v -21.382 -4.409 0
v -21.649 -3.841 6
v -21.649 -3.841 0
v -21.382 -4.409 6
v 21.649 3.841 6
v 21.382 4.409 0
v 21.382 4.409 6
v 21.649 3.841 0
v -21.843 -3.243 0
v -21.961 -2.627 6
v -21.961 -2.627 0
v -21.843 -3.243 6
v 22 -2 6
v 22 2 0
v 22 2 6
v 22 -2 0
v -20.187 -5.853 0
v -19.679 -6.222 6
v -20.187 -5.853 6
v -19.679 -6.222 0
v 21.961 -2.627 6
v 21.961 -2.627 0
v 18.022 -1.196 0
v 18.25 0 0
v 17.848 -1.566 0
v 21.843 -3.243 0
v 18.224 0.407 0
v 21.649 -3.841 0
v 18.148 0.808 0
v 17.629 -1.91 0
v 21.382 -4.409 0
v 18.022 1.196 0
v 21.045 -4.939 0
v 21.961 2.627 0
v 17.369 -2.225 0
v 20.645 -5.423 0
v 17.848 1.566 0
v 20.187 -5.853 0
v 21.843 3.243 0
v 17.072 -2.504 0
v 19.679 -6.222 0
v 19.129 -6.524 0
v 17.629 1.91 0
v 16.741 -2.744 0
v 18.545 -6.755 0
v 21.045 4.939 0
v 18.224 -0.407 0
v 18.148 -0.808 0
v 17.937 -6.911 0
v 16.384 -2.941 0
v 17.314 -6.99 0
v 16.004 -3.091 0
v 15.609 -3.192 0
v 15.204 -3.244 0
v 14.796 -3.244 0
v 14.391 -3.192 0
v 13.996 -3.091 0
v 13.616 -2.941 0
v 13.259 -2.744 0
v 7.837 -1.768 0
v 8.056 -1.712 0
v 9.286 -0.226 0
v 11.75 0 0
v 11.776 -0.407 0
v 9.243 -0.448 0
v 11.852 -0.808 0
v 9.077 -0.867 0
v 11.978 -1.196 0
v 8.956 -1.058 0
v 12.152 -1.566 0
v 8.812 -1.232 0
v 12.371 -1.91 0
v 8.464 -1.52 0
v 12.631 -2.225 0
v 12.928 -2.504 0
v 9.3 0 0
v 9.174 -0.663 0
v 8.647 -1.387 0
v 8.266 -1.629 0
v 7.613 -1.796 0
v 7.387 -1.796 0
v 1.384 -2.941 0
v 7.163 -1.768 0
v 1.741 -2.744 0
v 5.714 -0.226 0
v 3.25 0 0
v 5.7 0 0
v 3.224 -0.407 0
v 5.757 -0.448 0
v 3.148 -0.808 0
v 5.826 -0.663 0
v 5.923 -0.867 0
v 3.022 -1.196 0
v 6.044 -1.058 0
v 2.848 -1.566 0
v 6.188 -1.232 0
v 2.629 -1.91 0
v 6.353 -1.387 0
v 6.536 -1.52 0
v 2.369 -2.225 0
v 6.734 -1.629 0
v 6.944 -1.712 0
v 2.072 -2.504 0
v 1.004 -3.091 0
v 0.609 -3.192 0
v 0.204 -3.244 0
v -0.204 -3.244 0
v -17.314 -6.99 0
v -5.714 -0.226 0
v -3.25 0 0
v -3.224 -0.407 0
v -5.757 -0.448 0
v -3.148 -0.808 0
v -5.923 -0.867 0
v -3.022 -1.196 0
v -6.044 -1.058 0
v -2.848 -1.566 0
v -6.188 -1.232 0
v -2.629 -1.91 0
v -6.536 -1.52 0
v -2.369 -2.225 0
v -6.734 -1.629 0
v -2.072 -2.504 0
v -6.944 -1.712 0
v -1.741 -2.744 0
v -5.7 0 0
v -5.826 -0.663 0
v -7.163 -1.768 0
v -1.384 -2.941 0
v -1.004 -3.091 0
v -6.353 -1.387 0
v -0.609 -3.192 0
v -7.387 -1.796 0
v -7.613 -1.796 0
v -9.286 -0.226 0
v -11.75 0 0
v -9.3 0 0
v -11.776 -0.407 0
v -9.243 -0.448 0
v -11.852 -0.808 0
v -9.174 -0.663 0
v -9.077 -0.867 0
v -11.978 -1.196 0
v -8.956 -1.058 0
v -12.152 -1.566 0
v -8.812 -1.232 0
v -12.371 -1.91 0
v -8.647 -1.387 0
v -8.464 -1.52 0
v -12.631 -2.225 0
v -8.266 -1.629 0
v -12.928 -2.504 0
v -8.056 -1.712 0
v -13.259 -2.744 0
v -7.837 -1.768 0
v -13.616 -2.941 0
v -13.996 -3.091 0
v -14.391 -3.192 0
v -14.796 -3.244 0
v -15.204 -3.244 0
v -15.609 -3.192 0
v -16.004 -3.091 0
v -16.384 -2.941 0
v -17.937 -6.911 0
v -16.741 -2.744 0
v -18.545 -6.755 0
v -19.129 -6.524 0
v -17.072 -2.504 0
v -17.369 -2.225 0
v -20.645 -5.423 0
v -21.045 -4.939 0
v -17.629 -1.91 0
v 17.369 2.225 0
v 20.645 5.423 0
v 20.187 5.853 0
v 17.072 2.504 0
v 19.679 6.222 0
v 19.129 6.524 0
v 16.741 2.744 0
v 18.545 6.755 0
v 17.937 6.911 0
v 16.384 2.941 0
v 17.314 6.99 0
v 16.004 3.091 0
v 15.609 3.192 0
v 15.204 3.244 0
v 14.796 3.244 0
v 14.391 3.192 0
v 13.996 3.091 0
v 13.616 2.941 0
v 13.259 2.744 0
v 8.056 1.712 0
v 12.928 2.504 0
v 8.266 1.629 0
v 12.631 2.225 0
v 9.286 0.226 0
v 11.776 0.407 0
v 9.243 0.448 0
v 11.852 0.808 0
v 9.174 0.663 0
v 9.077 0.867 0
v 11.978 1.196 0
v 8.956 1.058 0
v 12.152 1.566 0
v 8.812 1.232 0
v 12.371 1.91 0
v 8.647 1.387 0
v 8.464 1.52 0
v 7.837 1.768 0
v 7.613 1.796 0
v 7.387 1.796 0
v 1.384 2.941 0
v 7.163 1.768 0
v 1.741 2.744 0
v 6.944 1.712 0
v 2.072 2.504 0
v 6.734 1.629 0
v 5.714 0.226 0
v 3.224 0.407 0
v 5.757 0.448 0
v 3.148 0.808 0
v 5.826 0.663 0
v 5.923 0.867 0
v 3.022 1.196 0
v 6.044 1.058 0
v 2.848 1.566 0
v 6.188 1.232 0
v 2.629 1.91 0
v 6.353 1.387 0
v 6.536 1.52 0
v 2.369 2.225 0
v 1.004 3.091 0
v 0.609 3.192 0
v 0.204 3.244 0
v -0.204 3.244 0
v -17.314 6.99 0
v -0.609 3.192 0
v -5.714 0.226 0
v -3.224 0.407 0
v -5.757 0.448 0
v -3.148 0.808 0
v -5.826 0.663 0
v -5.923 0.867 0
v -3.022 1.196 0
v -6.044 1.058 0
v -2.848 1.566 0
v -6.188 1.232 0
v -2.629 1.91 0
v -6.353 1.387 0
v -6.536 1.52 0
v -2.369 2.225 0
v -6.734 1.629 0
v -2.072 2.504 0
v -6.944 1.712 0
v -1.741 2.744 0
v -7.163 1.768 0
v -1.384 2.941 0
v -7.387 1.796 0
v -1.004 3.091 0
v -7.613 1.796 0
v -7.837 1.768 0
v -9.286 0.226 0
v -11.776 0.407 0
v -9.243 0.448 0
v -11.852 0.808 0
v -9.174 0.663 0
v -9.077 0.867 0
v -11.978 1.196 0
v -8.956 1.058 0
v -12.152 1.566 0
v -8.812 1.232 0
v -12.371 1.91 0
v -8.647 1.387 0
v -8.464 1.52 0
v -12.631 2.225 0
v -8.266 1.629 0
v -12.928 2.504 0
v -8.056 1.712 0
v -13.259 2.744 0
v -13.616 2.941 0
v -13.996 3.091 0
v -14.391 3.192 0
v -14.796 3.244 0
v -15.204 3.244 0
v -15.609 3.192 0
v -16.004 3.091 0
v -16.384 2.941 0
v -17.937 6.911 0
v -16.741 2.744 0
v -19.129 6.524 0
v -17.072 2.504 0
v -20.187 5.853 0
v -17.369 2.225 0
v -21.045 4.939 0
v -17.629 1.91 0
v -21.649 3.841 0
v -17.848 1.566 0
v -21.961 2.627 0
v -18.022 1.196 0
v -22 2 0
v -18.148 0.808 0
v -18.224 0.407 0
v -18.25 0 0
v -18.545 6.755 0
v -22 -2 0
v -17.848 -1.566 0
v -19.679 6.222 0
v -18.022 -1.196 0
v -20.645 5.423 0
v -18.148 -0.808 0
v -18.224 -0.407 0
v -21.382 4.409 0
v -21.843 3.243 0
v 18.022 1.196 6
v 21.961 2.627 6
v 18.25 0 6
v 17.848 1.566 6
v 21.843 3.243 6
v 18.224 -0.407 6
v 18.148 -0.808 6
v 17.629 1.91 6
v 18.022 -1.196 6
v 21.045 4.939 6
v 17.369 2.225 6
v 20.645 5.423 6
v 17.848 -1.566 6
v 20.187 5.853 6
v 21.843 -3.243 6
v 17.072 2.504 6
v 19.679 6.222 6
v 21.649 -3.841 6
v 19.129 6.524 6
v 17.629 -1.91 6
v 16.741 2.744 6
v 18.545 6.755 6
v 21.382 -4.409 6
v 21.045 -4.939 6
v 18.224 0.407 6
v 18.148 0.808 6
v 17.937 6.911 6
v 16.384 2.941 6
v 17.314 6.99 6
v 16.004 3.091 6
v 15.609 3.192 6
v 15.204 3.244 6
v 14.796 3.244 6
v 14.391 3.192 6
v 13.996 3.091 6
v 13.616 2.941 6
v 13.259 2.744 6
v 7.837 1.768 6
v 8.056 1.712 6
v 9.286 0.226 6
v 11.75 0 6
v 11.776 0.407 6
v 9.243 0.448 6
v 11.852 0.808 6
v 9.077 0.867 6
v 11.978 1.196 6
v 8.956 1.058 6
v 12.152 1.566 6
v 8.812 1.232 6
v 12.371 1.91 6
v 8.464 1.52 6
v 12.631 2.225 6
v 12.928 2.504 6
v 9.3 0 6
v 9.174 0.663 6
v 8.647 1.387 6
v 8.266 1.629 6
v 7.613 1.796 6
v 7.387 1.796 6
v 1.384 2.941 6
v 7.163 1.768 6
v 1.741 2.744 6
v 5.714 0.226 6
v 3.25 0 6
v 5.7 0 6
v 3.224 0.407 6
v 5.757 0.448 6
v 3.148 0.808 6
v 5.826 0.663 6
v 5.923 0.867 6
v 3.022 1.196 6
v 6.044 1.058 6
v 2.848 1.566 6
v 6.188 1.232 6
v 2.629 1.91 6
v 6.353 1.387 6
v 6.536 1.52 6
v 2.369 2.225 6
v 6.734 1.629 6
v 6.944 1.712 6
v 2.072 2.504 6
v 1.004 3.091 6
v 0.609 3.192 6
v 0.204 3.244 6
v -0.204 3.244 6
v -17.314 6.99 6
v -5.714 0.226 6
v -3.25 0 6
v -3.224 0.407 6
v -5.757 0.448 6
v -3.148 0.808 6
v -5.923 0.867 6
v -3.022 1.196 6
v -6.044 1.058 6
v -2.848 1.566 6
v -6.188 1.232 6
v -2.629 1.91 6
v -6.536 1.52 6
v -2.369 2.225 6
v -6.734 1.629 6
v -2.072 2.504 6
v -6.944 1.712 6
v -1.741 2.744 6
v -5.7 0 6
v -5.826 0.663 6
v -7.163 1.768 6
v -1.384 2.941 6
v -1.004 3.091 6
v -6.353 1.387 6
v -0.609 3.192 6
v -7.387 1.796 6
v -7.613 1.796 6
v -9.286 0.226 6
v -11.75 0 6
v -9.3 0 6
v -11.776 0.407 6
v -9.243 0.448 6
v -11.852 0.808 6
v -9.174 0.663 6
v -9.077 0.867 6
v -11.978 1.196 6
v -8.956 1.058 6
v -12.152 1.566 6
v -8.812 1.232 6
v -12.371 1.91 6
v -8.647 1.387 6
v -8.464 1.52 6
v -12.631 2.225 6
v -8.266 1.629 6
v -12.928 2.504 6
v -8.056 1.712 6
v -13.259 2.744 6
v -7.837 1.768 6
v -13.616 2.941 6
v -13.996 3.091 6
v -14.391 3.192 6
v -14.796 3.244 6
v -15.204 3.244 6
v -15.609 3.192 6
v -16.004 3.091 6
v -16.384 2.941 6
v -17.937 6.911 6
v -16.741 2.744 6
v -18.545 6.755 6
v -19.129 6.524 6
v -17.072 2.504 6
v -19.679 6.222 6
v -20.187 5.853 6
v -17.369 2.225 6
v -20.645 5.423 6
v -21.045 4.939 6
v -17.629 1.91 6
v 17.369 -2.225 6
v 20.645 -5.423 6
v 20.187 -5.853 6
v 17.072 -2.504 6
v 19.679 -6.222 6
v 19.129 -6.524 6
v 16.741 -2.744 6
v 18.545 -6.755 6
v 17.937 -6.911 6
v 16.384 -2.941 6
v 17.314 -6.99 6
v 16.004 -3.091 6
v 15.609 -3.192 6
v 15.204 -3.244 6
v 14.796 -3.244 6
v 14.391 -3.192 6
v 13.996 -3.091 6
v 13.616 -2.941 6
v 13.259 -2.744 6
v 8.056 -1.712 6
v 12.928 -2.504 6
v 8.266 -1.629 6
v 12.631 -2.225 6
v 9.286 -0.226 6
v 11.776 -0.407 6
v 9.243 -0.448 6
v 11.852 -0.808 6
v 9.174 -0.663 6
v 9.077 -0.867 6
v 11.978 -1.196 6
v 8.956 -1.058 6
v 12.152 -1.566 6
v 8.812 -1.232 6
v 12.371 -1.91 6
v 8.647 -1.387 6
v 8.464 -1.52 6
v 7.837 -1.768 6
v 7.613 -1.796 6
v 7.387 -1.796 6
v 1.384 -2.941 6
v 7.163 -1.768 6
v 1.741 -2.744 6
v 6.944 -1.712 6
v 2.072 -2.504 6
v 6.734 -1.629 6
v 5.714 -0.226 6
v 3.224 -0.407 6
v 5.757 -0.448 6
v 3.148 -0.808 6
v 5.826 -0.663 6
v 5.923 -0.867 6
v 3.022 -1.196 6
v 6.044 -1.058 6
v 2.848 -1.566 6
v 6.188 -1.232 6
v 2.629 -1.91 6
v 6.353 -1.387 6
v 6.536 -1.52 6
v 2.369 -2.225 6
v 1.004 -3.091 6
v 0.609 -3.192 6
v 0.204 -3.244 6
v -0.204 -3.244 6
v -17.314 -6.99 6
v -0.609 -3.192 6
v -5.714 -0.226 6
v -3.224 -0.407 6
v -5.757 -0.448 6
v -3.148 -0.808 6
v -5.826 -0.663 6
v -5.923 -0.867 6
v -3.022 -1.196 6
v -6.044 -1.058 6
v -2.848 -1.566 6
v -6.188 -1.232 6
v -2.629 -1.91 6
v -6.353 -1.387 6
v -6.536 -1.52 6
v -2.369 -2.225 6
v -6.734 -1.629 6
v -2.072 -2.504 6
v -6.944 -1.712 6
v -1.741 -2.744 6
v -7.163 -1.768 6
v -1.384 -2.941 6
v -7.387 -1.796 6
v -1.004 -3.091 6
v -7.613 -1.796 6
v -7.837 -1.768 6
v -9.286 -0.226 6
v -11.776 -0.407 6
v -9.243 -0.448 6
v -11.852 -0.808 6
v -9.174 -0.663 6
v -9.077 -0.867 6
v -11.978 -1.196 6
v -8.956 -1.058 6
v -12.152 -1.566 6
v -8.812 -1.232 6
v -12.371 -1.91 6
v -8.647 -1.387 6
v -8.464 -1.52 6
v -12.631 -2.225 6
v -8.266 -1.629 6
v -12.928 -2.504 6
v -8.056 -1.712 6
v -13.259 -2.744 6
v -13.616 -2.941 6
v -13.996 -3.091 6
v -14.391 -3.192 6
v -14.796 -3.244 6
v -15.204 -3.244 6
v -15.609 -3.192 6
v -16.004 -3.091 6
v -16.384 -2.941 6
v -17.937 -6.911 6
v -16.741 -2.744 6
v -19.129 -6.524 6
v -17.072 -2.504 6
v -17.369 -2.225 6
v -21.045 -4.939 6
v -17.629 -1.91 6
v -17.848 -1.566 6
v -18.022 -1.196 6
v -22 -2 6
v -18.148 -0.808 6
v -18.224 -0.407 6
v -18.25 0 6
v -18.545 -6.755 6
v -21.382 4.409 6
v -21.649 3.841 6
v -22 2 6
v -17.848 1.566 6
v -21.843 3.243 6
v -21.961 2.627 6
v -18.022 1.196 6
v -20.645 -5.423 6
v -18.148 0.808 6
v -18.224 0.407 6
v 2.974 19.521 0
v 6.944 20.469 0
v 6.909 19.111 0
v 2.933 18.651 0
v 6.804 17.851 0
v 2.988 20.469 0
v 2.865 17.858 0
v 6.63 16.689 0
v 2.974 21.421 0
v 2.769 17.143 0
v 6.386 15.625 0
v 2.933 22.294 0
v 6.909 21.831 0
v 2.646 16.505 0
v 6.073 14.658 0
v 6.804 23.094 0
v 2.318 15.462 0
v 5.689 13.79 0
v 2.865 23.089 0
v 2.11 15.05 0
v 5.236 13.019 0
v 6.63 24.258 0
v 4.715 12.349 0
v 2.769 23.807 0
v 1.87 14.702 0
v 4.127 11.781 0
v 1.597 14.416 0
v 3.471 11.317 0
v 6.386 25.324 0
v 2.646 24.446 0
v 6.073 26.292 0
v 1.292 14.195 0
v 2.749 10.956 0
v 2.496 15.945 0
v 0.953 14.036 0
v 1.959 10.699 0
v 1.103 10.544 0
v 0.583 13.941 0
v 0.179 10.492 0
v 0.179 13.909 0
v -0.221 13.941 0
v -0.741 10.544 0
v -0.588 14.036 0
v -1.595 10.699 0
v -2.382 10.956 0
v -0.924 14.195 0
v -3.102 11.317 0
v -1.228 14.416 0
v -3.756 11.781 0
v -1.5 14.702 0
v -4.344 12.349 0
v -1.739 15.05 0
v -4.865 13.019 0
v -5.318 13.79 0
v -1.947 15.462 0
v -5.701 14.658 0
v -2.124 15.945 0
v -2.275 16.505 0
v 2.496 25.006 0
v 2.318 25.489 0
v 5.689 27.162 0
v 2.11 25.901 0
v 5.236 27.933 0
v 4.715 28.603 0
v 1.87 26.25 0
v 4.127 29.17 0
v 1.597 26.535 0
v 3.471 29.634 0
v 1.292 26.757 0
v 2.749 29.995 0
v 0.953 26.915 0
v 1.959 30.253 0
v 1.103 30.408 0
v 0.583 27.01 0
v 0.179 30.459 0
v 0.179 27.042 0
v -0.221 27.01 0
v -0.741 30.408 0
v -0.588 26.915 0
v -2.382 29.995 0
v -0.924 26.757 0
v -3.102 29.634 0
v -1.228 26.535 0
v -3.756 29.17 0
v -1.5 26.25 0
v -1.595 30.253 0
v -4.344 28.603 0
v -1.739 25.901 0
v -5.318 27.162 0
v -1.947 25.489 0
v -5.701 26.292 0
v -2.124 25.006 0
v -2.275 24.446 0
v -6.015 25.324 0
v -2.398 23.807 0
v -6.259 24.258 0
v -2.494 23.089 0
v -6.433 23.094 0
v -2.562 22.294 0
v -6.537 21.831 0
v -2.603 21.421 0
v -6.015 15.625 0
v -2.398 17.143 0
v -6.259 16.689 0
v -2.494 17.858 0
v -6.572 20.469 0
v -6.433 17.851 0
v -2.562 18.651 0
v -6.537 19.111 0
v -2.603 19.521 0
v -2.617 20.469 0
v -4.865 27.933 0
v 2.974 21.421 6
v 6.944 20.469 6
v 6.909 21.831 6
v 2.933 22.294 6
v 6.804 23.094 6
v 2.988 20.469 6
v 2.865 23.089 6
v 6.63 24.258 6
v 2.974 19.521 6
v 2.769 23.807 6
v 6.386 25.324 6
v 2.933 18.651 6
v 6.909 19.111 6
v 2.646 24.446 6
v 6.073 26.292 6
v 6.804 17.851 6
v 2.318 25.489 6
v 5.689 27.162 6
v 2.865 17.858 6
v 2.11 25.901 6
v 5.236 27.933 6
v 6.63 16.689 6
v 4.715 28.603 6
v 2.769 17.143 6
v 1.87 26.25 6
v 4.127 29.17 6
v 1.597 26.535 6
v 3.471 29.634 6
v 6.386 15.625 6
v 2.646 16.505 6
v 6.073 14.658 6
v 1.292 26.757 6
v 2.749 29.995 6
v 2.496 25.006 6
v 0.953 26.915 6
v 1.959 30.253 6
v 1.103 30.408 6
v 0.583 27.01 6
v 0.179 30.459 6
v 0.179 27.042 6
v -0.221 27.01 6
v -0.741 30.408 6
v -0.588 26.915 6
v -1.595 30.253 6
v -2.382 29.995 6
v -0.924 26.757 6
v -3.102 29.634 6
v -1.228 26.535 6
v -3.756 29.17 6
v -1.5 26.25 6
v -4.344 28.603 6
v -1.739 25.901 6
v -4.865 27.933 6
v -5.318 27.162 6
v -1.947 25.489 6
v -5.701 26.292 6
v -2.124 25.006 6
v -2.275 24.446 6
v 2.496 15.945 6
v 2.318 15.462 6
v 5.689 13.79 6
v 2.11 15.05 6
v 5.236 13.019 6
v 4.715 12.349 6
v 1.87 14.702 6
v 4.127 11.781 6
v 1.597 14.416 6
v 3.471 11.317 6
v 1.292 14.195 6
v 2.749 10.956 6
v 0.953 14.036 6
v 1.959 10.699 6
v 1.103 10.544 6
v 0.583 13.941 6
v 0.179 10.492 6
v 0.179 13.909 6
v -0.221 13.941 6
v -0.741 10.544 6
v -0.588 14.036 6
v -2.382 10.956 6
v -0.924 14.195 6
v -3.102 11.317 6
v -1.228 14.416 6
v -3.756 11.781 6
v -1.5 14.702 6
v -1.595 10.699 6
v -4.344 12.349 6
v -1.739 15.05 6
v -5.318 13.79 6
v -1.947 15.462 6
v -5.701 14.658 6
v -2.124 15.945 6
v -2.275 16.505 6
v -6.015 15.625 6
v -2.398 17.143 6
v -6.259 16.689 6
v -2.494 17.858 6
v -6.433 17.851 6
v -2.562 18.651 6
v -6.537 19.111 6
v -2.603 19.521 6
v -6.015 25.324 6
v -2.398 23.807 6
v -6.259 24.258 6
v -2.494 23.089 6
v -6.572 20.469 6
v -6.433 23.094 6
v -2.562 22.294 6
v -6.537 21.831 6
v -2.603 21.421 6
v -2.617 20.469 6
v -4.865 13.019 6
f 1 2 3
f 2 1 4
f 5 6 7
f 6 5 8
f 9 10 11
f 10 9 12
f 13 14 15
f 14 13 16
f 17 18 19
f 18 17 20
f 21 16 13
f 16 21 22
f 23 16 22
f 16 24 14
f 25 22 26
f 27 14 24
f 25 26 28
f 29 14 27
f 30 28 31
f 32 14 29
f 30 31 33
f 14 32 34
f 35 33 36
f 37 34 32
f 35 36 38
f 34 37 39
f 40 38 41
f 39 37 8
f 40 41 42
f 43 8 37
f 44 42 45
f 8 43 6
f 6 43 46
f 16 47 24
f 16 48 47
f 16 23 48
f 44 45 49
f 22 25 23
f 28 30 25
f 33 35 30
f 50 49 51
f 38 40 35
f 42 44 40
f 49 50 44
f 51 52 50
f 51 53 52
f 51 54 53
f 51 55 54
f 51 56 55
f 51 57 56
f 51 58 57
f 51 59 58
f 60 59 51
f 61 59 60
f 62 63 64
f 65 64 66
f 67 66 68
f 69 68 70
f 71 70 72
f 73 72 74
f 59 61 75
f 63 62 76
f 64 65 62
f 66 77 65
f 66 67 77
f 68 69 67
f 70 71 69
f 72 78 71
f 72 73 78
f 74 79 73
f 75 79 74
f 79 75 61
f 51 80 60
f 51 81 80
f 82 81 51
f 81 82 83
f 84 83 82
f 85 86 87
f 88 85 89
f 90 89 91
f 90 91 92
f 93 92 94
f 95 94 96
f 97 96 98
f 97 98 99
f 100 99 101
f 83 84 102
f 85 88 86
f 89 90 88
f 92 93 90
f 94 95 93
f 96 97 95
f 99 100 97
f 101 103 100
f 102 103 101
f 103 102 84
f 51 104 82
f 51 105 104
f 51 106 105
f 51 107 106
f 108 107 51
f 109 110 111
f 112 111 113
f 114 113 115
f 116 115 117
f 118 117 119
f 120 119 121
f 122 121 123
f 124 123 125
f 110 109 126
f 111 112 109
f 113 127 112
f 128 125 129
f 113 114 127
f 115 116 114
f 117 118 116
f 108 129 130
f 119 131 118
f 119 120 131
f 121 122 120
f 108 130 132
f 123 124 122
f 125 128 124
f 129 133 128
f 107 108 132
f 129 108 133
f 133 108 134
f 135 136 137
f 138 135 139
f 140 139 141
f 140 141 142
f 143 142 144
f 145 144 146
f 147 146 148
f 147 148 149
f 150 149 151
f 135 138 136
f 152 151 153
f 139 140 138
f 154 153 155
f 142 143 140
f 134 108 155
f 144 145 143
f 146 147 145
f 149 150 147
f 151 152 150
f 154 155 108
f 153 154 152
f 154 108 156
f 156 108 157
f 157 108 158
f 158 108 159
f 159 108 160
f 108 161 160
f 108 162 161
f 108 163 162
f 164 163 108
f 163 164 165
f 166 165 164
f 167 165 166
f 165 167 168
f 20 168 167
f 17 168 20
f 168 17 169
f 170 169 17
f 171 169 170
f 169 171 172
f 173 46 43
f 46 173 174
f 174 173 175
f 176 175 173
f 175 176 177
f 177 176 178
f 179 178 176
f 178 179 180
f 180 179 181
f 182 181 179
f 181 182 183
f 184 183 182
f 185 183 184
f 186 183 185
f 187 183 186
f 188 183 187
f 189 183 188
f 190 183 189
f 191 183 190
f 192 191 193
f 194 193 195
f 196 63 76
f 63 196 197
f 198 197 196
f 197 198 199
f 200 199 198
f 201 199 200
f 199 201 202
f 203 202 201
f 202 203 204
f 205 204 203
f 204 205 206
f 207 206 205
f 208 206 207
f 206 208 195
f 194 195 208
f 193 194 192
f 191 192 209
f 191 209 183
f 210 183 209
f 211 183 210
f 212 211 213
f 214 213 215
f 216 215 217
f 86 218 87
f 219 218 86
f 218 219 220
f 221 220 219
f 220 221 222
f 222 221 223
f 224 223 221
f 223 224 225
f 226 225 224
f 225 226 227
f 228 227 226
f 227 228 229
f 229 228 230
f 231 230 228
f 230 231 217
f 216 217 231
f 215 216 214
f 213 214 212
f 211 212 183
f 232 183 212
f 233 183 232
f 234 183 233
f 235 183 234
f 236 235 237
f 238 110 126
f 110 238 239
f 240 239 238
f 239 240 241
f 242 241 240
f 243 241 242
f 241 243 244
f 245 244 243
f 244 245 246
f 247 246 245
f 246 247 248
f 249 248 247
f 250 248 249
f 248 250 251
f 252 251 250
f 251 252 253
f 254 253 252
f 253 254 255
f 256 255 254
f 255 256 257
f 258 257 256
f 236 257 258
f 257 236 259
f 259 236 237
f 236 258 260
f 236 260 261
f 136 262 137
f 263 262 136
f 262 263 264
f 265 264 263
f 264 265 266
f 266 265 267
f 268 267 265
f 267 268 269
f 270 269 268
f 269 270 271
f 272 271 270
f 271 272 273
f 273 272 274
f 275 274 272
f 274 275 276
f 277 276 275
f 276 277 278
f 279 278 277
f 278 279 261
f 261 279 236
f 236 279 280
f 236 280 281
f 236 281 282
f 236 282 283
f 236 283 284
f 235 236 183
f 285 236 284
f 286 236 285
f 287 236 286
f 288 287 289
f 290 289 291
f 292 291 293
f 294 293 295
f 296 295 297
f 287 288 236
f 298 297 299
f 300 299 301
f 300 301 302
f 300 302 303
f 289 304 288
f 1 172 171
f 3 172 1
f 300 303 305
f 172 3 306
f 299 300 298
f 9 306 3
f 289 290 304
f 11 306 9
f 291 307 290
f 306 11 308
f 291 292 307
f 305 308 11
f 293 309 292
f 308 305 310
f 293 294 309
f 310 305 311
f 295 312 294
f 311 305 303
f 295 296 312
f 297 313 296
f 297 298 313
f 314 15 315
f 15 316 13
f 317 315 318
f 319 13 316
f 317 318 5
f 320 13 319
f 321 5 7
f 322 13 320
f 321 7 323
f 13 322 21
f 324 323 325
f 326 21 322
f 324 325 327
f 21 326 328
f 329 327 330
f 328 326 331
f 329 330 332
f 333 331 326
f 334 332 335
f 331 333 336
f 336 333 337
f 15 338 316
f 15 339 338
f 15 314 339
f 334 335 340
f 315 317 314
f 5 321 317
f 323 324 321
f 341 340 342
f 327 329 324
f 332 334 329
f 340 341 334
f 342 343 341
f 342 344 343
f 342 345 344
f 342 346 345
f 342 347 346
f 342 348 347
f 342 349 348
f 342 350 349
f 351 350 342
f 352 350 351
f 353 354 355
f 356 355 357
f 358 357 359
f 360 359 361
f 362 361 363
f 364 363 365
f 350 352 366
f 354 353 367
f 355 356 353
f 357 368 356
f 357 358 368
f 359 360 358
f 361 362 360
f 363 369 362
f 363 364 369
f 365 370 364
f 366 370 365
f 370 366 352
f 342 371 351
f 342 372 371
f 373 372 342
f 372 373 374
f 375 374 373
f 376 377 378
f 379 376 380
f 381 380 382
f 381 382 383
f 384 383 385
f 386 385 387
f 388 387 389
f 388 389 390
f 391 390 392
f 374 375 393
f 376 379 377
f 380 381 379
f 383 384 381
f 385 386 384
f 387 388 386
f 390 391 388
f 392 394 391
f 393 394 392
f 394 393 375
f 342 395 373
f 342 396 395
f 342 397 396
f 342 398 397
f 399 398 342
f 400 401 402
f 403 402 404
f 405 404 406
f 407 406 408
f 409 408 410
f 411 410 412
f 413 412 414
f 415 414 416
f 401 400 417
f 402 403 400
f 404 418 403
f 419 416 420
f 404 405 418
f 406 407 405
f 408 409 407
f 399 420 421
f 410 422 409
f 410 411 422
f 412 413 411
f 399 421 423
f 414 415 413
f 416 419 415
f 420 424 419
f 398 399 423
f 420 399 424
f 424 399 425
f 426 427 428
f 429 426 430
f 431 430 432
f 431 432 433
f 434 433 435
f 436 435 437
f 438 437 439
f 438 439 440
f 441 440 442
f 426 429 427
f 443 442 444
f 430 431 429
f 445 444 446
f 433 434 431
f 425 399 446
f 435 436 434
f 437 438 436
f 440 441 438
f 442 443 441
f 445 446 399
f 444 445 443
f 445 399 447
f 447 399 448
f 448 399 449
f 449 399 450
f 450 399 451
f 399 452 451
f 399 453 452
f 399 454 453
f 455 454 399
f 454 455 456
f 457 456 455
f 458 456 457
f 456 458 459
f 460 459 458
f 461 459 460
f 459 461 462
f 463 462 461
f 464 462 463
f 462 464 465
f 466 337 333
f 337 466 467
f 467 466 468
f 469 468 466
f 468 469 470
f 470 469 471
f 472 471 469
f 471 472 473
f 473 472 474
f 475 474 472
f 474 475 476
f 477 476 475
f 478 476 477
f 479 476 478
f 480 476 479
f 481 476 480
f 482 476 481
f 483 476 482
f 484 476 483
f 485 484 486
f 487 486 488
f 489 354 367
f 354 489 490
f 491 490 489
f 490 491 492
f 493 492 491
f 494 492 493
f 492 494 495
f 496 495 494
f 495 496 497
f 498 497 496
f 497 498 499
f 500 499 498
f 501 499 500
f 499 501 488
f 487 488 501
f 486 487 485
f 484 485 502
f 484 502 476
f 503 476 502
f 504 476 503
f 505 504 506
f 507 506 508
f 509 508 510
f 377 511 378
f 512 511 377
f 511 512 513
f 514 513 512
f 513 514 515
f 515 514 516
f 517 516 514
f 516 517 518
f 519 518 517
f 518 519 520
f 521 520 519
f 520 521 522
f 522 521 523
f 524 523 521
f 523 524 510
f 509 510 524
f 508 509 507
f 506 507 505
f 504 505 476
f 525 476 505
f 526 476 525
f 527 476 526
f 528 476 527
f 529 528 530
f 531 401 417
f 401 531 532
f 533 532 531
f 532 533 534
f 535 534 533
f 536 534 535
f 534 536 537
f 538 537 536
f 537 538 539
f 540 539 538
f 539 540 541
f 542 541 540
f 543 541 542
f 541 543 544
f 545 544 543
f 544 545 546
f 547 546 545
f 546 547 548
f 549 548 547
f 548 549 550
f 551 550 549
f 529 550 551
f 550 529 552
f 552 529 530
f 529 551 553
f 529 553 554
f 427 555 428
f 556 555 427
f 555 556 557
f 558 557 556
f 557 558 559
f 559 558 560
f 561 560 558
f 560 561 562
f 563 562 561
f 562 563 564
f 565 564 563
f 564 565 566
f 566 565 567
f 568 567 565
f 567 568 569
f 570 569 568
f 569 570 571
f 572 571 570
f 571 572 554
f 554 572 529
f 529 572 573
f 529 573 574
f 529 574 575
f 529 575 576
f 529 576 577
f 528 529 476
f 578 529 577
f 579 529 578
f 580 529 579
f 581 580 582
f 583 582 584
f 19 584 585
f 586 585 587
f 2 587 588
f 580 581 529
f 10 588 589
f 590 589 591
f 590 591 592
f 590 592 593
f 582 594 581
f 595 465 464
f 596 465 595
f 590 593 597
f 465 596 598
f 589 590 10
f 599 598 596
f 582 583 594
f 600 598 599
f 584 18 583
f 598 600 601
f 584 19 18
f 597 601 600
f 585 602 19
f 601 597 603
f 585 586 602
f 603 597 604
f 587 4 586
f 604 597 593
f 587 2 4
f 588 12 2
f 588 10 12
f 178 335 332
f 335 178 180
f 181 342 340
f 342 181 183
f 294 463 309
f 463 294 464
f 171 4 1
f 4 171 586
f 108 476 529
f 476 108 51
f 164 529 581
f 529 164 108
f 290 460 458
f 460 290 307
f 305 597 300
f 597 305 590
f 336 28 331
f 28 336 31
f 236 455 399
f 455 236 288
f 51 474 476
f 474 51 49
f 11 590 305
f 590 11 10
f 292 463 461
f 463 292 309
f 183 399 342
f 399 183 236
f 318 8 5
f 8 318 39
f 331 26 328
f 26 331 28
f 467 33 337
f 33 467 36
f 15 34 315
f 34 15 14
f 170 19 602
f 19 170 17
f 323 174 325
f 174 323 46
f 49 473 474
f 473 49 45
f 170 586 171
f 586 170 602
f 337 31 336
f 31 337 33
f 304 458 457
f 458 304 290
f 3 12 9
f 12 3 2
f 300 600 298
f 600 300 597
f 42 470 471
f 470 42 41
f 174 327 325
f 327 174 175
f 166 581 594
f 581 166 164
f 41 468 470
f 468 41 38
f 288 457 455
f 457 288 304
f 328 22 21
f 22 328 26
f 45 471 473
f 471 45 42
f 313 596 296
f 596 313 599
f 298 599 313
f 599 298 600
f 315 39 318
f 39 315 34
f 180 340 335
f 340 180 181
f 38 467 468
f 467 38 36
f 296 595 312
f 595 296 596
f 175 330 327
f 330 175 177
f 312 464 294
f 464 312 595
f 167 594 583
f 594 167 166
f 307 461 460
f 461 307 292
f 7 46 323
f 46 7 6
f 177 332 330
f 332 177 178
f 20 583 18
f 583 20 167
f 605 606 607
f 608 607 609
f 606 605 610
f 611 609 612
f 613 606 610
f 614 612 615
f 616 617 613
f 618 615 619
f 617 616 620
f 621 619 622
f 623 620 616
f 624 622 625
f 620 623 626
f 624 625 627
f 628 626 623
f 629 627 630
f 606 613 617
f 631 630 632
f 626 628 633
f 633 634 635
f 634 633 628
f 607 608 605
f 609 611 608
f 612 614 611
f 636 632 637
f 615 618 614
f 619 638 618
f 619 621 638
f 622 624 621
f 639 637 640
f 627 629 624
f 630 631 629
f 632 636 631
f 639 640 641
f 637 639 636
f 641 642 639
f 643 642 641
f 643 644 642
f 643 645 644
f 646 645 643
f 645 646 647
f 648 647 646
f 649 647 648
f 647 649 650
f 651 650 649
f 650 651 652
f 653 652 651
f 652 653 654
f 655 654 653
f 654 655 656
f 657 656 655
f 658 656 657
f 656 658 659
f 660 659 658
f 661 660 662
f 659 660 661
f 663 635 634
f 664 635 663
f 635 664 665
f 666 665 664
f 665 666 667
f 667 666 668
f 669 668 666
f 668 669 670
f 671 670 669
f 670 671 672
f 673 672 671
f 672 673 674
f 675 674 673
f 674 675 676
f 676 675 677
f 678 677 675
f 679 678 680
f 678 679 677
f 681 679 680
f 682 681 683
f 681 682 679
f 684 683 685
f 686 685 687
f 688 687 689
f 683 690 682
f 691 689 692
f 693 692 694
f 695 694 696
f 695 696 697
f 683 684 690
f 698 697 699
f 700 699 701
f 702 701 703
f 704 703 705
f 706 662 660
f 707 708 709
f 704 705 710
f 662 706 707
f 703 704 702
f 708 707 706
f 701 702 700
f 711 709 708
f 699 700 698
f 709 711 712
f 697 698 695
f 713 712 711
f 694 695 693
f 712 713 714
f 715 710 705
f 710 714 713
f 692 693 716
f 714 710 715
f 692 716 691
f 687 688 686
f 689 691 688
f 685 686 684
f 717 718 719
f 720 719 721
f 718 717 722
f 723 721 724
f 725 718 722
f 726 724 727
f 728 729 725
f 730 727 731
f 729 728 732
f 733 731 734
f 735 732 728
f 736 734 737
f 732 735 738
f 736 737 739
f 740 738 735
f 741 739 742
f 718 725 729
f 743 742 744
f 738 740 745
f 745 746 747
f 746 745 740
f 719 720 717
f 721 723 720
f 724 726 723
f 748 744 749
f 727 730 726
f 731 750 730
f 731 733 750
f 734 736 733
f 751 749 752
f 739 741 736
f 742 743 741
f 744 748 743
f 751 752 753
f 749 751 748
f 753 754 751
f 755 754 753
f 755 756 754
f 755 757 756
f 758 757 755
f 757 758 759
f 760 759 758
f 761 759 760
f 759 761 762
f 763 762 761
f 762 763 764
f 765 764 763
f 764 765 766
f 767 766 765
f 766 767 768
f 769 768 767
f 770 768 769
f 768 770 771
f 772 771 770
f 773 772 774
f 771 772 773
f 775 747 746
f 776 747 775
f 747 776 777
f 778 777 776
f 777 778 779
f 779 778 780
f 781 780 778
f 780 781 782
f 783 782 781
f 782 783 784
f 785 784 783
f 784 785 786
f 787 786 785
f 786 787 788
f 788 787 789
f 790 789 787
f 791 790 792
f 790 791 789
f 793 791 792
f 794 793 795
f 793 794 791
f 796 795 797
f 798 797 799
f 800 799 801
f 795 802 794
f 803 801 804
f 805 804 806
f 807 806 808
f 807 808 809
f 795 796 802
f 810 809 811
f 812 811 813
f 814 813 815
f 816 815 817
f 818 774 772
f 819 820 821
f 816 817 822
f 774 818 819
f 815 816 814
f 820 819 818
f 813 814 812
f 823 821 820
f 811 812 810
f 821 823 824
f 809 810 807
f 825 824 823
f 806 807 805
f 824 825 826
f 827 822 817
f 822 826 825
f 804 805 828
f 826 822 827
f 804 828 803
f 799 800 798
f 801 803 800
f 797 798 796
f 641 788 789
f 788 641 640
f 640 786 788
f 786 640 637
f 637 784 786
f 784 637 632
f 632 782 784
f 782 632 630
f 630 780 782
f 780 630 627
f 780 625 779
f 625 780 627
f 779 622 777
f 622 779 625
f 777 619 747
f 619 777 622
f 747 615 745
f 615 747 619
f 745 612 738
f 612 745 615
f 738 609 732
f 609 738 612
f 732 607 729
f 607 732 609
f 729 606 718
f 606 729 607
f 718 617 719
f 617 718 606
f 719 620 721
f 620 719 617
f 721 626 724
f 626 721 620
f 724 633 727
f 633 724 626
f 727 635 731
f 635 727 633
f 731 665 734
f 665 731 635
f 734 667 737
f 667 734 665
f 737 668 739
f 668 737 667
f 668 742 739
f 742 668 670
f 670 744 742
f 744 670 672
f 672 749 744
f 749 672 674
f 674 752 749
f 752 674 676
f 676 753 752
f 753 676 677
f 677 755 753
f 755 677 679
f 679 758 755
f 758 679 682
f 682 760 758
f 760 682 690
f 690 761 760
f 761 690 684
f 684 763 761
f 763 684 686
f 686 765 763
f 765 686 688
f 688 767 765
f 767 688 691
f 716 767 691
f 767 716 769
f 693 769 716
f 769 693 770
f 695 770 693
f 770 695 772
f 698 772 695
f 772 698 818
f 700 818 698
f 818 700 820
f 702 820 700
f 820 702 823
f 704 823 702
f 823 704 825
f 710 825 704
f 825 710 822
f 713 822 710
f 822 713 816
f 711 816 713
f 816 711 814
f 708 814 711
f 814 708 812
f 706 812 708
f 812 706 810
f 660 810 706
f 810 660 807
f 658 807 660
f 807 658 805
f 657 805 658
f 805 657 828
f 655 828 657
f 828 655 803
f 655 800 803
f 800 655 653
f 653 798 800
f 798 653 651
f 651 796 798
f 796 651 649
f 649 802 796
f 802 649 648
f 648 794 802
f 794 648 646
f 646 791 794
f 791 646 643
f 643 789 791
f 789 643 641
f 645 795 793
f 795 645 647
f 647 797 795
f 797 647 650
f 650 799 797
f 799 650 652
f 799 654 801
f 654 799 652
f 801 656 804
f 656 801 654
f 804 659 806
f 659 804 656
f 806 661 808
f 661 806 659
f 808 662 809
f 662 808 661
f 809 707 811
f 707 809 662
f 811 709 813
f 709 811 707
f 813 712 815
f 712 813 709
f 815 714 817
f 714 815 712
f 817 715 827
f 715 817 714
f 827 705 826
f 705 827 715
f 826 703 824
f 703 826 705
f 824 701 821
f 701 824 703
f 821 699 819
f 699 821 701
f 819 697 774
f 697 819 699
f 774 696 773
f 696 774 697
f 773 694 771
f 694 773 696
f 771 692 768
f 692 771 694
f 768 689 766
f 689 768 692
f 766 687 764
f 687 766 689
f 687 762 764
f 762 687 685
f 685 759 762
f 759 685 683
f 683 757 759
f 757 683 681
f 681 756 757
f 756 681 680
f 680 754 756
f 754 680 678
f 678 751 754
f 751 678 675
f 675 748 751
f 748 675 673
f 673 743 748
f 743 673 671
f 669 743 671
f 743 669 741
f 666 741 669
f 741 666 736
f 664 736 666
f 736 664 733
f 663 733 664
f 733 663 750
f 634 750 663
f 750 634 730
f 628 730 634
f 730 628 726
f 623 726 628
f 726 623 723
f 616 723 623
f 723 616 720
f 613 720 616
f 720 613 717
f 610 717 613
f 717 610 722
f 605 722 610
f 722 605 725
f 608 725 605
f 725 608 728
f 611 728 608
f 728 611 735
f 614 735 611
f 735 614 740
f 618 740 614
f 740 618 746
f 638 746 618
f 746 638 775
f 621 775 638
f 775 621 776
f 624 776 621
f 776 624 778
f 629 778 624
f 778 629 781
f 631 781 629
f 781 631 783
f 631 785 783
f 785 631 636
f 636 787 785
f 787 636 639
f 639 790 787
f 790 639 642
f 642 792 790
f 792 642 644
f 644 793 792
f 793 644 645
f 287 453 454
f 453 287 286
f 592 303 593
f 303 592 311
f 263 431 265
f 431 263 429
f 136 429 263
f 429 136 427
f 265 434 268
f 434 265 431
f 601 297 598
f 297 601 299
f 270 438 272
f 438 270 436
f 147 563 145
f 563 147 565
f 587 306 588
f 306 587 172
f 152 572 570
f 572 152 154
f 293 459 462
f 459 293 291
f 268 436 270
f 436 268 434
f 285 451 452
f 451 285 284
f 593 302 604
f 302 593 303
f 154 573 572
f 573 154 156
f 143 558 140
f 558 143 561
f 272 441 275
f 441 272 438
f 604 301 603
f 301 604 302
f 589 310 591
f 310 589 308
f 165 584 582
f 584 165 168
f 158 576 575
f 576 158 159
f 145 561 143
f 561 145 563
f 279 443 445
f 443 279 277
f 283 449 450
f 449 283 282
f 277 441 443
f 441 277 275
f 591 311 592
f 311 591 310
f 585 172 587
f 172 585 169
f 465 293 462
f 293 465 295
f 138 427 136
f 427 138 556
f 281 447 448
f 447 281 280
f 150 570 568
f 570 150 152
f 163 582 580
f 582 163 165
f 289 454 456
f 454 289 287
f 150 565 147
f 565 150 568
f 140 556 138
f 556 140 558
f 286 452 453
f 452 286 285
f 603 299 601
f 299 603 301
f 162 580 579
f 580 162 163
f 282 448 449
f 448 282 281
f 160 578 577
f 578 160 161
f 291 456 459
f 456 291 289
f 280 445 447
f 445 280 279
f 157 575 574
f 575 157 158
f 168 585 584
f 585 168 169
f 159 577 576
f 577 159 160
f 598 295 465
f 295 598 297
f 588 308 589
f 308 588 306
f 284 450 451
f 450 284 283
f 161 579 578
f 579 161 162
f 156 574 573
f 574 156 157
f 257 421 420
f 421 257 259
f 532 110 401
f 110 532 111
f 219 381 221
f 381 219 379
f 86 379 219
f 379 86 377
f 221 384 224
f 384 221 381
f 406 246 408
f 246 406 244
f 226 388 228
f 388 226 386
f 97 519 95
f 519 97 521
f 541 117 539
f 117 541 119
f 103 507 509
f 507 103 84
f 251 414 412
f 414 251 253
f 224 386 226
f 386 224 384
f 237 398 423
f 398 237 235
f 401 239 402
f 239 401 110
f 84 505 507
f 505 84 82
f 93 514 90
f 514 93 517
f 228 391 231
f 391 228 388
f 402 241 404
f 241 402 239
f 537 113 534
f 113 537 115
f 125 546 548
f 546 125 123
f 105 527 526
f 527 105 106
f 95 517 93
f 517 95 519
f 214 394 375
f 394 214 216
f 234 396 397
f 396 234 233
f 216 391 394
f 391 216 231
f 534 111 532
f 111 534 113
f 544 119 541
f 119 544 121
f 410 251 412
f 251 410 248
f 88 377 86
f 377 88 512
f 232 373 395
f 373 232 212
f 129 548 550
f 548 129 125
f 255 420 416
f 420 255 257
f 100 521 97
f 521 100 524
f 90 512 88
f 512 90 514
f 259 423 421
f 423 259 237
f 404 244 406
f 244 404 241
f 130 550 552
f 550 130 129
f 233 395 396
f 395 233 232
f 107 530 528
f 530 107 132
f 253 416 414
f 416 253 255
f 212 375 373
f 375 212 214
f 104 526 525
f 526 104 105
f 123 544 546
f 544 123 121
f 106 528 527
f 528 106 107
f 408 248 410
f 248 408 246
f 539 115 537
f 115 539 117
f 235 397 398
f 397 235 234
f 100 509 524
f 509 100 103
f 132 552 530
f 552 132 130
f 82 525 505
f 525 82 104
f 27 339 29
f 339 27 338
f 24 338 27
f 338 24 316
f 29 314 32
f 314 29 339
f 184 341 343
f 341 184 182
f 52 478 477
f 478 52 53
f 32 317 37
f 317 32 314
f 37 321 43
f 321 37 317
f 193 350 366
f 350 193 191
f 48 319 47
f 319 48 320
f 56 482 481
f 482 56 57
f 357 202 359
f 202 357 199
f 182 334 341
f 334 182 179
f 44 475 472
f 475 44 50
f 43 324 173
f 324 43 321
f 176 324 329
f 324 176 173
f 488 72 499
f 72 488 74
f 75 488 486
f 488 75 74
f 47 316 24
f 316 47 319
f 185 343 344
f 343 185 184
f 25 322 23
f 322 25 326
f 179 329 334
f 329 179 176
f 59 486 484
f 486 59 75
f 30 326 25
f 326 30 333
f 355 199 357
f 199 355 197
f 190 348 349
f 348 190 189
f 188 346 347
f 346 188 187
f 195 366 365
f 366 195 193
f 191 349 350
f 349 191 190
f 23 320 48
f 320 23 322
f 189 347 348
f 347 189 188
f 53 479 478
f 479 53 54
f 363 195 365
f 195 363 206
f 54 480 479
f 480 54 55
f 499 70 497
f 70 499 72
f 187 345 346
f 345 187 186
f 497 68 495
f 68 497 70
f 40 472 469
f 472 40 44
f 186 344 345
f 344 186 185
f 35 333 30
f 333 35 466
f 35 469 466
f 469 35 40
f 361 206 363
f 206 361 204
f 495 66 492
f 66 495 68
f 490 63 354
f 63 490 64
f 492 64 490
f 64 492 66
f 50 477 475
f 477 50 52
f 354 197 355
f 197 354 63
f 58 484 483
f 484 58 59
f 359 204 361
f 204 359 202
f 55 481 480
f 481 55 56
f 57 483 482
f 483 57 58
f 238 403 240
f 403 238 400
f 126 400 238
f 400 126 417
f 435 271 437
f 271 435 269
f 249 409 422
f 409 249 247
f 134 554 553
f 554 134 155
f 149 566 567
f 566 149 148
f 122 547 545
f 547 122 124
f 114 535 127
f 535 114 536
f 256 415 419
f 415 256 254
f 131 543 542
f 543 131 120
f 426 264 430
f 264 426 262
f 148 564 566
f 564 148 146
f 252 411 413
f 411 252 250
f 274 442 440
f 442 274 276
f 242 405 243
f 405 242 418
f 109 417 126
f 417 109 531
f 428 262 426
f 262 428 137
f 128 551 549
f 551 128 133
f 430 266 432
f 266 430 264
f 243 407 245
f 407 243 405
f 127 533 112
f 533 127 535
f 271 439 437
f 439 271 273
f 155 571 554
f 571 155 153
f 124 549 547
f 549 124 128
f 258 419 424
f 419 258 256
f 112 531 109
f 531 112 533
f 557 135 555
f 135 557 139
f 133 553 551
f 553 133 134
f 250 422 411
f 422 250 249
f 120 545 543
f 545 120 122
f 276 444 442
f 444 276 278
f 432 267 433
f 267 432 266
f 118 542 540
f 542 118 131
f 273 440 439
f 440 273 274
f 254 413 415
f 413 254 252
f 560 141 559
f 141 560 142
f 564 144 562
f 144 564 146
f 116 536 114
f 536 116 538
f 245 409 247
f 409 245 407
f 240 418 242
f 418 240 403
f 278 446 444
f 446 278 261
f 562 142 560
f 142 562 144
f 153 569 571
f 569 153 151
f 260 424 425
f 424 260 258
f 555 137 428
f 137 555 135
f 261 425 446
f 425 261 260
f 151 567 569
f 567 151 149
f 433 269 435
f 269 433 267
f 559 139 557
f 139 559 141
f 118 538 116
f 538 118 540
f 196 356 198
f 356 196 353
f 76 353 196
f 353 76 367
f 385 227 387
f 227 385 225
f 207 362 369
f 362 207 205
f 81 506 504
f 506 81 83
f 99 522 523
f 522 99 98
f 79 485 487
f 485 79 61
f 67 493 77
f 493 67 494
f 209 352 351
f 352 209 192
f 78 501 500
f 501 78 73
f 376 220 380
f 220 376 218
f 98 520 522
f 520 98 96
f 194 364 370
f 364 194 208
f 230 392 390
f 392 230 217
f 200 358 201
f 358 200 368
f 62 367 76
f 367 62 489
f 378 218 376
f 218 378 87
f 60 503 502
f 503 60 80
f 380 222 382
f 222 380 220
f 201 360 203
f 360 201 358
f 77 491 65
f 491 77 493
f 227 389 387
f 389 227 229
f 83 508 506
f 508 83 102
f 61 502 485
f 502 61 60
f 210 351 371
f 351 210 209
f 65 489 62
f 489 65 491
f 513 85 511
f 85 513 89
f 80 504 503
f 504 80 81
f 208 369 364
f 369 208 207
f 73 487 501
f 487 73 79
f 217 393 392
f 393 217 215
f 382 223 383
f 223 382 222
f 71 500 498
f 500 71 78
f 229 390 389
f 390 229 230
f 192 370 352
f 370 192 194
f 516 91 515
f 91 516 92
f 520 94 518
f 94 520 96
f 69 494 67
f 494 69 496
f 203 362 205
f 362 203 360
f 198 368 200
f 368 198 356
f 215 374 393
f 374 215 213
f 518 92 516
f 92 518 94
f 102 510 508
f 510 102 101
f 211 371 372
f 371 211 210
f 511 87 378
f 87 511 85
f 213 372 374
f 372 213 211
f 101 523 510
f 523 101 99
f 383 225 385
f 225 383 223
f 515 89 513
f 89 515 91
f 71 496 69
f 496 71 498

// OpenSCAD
$fn = 50;


difference() {
	union() {
		hull() {
			translate(v = [-17.0000000000, 2.0000000000, 0]) {
				cylinder(h = 6, r = 5);
			}
			translate(v = [17.0000000000, 2.0000000000, 0]) {
				cylinder(h = 6, r = 5);
			}
			translate(v = [-17.0000000000, -2.0000000000, 0]) {
				cylinder(h = 6, r = 5);
			}
			translate(v = [17.0000000000, -2.0000000000, 0]) {
				cylinder(h = 6, r = 5);
			}
		}
		translate(v = [0, 30.0000000000, 0]) {
			linear_extrude(height = 6) {
				text(font = "DejaVu Sans Mono:style=Bold", halign = "center", size = 19.0000000000, text = "O", valign = "top");
			}
		}
	}
	union() {
		translate(v = [-15.0000000000, 0.0000000000, 0]) {
			translate(v = [0, 0, -100]) {
				cylinder(h = 200, r = 3.2500000000);
			}
		}
		translate(v = [0, 0, -100]) {
			cylinder(h = 200, r = 3.2500000000);
		}
		translate(v = [15.0000000000, 0.0000000000, 0]) {
			translate(v = [0, 0, -100]) {
				cylinder(h = 200, r = 3.2500000000);
			}
		}
		translate(v = [-15.0000000000, 0.0000000000, 0]) {
			translate(v = [0, 0, -100]) {
				cylinder(h = 200, r = 1.8000000000);
			}
		}
		translate(v = [-7.5000000000, 0.0000000000, 0]) {
			translate(v = [0, 0, -100]) {
				cylinder(h = 200, r = 1.8000000000);
			}
		}
		translate(v = [0, 0, -100]) {
			cylinder(h = 200, r = 1.8000000000);
		}
		translate(v = [7.5000000000, 0.0000000000, 0]) {
			translate(v = [0, 0, -100]) {
				cylinder(h = 200, r = 1.8000000000);
			}
		}
		translate(v = [15.0000000000, 0.0000000000, 0]) {
			translate(v = [0, 0, -100]) {
				cylinder(h = 200, r = 1.8000000000);
			}
		}
	}
}
